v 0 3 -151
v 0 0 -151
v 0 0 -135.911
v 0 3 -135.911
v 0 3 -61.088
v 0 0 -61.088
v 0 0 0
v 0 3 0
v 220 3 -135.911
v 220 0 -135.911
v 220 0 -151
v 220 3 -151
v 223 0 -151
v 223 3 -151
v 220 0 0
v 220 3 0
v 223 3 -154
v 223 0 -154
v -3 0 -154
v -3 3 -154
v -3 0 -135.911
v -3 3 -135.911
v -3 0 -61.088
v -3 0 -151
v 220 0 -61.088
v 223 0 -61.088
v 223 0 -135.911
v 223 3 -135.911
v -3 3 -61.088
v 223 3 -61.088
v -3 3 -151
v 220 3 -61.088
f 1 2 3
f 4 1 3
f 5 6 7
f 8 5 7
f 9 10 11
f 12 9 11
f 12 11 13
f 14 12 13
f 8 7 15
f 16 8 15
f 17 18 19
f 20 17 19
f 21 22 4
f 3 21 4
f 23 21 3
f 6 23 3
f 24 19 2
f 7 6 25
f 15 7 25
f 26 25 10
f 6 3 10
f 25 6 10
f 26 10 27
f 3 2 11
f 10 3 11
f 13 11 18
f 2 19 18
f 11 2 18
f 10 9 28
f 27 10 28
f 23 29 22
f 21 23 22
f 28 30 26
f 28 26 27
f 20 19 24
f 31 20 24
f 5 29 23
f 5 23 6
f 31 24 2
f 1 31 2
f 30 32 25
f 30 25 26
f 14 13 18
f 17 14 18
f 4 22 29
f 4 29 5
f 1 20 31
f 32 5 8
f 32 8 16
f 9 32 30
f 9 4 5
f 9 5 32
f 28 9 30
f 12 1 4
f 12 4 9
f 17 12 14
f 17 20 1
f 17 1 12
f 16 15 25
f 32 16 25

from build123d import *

# Parameters (mm, degrees)
BOSS_EXTRUDE1_DEPTH = 3
SKETCH3_W           = 3
SKETCH3_H           = 74.822620372
BOSS_EXTRUDE2_DEPTH = 3


with BuildPart() as part:
    # Sketch1 → Boss-Extrude1 (new body)
    with BuildSketch(Plane(origin=(0, 0, 0), x_dir=(1, 0, 0), z_dir=(0, 1, 0))):
        Polygon((0, 154), (-3, 154), (-3, 151), (0, 151), (0, 0), (220, 0), (220, 151), (223, 151), (223, 154), (220, 154), align=None)
    extrude(amount=BOSS_EXTRUDE1_DEPTH)

    # Sketch3 → Boss-Extrude2 (add)
    with BuildSketch(Plane(origin=(0, 3, 0), x_dir=(1, 0, 0), z_dir=(0, 1, 0))):
        with Locations((-1.5, 98.49947017)):
            Rectangle(SKETCH3_W, SKETCH3_H)
        with Locations((221.5, 98.49947017)):
            Rectangle(SKETCH3_W, SKETCH3_H)
    extrude(amount=-BOSS_EXTRUDE2_DEPTH)


solid = part.part
